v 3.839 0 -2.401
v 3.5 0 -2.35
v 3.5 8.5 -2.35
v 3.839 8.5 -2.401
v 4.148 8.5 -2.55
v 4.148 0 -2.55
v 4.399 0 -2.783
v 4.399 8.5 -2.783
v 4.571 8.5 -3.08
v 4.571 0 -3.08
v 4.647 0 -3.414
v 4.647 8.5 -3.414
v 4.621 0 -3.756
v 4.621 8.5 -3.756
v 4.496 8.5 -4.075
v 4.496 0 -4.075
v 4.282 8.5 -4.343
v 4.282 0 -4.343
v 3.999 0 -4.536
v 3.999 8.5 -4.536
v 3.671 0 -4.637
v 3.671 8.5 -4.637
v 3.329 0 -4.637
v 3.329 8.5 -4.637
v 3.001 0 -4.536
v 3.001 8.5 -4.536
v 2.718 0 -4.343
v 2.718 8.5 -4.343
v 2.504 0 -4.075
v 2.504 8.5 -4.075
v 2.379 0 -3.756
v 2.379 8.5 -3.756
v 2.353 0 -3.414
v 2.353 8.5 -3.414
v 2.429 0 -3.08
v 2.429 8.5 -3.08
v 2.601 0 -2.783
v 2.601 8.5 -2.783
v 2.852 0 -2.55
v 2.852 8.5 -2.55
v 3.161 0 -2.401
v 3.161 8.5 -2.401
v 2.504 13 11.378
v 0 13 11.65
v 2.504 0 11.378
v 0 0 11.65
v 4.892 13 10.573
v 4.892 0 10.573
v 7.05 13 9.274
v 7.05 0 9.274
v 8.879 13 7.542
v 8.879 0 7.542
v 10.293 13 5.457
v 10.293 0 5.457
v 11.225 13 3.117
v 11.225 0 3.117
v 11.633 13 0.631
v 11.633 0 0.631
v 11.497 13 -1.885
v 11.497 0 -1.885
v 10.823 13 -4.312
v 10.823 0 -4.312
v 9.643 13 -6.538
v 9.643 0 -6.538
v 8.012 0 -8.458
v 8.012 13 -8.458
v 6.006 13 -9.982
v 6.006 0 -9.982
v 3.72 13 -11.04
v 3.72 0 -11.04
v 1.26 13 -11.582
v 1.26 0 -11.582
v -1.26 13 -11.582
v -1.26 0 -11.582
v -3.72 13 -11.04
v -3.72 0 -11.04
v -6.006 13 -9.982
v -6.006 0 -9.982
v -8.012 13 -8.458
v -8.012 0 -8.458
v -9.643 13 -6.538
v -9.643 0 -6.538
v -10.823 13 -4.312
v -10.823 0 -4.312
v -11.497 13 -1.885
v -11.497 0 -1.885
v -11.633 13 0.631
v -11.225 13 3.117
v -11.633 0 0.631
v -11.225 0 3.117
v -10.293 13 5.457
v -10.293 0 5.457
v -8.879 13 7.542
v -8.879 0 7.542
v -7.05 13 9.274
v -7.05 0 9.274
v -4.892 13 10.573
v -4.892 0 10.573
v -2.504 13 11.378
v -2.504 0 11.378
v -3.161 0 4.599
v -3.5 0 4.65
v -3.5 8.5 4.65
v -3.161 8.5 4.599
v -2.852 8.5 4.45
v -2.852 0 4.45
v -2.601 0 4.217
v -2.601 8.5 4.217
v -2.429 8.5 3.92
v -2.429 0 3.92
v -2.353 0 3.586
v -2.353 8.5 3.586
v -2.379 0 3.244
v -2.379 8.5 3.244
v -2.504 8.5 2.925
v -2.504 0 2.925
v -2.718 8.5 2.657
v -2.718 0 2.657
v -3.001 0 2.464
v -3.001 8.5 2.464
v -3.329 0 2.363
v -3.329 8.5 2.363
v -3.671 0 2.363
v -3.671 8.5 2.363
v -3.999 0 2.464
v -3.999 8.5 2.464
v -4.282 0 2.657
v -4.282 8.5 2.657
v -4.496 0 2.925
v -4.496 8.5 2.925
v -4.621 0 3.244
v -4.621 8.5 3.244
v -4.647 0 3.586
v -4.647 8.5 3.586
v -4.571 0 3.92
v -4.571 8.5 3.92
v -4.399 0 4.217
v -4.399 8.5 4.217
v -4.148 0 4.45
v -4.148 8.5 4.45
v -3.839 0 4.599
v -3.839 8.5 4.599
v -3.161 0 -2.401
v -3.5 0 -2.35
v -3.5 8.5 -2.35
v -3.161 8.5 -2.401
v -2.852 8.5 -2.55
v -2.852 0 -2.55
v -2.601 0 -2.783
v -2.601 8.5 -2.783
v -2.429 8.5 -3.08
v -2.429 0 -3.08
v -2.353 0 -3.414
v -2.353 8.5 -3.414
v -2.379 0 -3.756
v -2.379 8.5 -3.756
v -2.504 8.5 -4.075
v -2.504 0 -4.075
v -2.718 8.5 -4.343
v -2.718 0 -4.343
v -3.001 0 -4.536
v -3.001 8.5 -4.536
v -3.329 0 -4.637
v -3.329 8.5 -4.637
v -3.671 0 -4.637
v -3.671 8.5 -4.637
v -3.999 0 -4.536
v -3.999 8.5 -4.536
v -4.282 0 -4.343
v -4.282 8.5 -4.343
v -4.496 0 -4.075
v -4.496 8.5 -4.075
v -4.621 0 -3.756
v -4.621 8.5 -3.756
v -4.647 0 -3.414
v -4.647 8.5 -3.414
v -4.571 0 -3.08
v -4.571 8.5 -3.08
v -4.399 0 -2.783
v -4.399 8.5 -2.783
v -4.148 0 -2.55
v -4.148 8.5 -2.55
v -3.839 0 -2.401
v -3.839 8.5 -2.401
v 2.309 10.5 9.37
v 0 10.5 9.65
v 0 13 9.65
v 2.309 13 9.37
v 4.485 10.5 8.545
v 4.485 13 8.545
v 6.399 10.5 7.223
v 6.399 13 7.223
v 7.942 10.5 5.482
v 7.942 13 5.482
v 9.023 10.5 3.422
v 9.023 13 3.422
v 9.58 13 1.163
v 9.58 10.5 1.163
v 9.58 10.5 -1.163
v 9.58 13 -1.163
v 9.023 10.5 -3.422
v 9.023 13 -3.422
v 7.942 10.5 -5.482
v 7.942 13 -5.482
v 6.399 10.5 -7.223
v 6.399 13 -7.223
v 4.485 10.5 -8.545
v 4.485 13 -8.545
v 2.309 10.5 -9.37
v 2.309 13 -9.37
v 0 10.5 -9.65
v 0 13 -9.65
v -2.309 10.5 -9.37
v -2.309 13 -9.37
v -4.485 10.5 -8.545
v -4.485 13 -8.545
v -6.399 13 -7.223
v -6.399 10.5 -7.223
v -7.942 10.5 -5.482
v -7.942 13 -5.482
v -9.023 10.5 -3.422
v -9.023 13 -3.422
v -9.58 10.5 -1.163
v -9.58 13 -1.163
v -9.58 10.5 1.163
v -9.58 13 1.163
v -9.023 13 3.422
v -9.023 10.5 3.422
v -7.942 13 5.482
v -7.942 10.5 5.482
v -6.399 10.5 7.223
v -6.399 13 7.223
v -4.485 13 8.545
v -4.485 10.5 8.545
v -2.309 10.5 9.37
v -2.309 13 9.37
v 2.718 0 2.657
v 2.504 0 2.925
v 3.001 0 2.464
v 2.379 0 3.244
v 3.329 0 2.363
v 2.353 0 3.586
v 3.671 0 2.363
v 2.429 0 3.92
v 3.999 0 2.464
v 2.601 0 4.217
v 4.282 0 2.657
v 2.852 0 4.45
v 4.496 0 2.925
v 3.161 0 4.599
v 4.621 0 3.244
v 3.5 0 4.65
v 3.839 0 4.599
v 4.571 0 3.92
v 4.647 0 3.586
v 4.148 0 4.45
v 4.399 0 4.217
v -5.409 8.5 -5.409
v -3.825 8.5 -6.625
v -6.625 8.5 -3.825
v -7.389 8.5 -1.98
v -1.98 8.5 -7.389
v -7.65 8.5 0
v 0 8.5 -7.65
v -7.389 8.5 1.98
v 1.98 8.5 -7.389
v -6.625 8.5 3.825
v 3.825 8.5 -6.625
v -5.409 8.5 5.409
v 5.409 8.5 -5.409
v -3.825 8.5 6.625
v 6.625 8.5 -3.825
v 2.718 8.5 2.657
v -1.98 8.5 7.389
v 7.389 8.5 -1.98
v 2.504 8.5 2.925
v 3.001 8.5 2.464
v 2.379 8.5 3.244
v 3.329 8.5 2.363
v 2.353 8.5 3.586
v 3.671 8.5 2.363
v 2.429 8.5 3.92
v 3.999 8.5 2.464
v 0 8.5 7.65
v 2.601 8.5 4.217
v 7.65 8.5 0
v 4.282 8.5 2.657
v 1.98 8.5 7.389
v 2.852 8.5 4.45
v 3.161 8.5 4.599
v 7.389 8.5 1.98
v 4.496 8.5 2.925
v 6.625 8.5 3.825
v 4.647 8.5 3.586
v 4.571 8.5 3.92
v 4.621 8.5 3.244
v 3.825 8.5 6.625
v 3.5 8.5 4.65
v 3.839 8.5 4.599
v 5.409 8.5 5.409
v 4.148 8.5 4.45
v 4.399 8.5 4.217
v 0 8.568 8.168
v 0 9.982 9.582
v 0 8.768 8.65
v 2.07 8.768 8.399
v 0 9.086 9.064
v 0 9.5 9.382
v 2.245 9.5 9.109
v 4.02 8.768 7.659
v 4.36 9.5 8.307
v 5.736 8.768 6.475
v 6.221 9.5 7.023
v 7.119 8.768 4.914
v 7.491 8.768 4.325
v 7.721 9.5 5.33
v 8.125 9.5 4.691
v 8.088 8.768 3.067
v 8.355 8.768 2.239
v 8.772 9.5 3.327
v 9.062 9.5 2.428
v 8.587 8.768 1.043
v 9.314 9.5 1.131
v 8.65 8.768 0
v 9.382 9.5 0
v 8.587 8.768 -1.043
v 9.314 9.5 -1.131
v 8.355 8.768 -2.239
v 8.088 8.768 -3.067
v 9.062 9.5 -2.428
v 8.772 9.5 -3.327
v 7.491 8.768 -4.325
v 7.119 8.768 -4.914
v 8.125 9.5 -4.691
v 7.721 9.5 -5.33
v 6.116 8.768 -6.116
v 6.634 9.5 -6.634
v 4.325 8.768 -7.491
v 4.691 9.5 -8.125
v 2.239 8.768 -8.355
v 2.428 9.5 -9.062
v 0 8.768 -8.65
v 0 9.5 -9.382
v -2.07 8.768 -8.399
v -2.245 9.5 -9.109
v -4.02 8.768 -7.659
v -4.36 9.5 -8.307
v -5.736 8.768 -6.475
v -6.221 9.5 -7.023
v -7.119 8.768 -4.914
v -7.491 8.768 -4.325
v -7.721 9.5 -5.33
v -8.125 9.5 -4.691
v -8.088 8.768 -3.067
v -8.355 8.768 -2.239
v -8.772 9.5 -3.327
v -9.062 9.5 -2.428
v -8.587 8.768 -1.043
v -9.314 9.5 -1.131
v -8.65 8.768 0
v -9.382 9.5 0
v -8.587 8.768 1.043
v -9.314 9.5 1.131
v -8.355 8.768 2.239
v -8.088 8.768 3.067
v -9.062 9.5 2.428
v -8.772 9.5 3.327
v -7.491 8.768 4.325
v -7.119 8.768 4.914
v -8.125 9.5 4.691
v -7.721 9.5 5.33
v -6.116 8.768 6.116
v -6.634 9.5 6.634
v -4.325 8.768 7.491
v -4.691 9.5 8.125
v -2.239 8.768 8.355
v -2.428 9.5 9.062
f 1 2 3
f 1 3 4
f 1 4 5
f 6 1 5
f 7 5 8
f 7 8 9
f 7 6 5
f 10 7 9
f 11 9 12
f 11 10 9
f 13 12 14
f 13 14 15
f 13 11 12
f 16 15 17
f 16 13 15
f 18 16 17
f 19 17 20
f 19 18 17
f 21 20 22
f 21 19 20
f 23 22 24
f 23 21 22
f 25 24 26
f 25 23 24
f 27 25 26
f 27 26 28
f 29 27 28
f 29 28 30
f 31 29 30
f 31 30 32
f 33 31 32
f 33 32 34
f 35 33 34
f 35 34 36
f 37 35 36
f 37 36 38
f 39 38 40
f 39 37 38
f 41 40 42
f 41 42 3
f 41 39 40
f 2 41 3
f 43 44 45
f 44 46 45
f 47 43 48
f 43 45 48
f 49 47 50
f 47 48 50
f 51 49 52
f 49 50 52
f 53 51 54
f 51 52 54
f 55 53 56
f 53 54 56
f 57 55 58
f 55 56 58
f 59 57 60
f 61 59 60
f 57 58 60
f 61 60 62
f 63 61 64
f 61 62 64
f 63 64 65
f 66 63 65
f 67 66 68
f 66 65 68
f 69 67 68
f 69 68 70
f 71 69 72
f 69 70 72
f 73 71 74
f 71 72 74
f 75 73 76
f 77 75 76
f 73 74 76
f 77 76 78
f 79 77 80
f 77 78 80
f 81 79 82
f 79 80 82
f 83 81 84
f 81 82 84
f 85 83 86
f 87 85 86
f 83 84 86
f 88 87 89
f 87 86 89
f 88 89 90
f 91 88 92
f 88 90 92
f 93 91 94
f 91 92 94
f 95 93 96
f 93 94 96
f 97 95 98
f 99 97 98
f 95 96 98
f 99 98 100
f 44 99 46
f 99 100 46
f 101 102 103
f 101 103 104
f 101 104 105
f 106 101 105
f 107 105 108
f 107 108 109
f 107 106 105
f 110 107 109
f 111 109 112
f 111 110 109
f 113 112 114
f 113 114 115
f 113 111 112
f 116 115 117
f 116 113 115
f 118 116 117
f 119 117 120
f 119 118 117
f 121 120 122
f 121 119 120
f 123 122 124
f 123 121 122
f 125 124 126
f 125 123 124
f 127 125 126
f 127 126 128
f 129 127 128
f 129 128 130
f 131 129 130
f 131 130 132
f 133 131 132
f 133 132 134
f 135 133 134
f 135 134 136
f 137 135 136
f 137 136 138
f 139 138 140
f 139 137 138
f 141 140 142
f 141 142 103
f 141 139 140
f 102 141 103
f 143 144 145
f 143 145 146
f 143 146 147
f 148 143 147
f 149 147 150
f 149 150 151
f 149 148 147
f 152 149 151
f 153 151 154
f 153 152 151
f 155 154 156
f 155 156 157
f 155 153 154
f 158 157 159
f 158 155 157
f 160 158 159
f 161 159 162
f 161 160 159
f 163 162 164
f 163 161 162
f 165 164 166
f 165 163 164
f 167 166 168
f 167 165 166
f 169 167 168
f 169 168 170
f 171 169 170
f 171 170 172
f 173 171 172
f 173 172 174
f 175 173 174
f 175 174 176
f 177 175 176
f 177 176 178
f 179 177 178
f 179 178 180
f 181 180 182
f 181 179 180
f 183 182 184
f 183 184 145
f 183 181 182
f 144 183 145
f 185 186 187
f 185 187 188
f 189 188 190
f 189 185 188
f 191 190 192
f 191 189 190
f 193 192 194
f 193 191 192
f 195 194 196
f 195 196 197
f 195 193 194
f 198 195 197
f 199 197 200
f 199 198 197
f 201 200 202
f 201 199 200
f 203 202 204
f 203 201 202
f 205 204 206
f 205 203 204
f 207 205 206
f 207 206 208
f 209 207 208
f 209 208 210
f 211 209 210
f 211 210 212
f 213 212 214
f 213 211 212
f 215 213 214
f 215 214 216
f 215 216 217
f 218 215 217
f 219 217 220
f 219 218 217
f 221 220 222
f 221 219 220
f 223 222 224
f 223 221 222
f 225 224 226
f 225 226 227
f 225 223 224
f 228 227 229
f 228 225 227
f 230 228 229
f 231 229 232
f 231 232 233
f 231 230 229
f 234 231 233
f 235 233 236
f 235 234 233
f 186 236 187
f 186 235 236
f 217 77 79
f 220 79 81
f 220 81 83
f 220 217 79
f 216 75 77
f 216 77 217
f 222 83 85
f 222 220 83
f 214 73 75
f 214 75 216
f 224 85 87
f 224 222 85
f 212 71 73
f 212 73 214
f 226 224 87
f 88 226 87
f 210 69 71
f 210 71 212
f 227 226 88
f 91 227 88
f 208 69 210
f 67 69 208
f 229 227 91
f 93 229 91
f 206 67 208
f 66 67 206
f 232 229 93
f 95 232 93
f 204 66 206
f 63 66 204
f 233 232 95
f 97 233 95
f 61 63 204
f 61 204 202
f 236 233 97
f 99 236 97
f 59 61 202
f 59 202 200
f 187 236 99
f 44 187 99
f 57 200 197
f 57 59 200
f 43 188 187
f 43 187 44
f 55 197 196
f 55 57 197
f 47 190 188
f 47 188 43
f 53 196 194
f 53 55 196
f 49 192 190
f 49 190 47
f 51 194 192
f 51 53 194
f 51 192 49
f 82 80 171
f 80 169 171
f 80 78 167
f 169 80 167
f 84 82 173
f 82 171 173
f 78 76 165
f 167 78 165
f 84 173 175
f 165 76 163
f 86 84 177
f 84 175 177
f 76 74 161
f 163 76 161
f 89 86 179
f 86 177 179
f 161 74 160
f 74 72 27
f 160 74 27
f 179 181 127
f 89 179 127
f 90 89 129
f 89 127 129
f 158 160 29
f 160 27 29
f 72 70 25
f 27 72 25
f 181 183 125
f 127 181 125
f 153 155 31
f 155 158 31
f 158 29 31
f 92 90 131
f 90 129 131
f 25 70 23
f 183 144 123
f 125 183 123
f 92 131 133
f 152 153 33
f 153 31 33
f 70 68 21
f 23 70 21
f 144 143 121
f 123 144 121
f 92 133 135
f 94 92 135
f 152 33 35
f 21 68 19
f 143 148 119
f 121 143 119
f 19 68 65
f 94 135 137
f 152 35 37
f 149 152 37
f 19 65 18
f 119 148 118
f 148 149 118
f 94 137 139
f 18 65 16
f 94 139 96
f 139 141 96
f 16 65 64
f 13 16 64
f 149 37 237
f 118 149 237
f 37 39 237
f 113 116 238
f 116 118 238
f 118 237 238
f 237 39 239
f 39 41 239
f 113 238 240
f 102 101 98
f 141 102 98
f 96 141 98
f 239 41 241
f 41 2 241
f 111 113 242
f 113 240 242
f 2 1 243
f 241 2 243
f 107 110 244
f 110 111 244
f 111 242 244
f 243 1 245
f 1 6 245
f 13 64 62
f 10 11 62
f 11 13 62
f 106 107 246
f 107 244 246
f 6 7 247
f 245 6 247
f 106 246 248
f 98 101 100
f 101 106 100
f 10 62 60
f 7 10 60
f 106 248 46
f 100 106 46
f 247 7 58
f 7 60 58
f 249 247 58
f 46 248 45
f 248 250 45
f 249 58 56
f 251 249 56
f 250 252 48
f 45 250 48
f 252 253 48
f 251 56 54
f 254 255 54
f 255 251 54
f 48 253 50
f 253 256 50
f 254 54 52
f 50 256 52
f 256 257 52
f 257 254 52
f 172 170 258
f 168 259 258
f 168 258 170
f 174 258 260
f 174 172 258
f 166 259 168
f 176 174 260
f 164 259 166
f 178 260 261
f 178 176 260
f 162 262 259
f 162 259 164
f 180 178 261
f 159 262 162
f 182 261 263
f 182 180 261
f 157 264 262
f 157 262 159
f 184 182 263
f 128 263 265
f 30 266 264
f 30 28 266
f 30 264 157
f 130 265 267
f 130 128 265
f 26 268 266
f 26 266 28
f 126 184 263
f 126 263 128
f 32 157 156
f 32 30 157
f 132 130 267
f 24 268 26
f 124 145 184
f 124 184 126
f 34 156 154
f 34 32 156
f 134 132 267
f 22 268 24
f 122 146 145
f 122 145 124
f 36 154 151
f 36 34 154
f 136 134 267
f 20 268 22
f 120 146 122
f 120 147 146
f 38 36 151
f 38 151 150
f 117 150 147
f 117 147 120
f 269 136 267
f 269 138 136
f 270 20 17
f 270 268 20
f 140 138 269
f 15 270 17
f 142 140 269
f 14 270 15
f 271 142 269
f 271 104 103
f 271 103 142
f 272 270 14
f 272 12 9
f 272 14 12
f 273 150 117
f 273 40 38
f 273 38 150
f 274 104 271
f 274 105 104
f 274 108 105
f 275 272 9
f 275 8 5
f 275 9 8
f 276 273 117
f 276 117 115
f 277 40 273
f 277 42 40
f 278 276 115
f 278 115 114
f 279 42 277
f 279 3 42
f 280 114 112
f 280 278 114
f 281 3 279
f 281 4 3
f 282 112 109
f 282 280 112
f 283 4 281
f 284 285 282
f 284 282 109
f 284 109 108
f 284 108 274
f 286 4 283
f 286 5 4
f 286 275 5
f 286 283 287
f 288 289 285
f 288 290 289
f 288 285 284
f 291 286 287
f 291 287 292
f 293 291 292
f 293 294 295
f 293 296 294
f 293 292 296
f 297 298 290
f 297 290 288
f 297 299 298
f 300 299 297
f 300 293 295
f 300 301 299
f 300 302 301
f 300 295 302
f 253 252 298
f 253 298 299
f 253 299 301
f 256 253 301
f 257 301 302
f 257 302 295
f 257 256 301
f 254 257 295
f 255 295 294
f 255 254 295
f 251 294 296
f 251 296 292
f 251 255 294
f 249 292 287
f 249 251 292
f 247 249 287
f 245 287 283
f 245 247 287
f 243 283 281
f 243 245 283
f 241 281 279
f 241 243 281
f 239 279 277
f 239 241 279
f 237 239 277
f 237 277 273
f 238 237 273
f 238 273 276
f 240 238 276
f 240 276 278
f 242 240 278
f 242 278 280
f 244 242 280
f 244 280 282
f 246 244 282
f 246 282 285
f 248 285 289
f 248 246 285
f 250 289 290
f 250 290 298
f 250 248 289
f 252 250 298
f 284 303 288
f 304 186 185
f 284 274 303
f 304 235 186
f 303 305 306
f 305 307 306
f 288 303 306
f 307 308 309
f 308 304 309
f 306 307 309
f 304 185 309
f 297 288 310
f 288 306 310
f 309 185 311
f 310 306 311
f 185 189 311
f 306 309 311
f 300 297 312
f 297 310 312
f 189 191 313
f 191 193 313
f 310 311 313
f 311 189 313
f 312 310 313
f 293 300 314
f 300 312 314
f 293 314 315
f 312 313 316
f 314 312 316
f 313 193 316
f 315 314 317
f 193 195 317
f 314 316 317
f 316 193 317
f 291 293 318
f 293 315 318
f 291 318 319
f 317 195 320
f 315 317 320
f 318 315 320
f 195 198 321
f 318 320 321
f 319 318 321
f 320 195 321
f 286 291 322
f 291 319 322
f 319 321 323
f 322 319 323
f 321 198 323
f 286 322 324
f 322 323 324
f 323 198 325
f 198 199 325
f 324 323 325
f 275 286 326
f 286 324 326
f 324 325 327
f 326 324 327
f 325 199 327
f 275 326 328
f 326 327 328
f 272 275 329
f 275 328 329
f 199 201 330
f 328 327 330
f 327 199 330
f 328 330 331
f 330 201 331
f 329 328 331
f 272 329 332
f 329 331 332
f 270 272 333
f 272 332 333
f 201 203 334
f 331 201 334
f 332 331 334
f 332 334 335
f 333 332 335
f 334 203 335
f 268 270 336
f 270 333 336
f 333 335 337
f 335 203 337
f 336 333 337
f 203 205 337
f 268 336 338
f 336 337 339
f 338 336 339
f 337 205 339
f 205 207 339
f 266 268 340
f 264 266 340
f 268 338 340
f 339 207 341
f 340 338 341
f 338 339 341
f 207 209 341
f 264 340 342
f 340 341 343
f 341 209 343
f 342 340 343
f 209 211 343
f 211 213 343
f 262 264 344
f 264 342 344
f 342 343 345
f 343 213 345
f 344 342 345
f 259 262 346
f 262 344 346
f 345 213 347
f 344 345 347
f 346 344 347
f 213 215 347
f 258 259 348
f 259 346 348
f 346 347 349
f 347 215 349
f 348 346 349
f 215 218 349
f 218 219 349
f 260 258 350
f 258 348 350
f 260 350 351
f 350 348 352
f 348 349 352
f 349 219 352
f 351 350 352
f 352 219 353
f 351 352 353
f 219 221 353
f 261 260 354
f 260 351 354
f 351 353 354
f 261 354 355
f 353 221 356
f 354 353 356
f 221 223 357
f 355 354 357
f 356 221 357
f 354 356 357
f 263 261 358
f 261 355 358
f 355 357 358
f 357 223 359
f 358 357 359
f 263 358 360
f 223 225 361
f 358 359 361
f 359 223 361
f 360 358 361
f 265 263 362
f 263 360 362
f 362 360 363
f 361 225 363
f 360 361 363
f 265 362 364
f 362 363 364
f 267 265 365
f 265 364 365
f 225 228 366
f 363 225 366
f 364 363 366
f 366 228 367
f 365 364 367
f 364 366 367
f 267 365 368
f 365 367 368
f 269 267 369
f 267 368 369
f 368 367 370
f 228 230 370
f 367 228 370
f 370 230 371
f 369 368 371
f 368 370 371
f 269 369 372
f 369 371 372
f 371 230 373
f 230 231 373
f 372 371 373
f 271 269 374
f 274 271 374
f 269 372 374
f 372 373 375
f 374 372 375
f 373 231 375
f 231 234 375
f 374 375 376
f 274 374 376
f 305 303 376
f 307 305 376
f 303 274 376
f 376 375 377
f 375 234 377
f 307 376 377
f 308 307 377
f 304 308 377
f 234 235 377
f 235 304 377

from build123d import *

# Parameters (mm, degrees)
SKETCH1_R           = 11.65
SKETCH1_R_2         = 1.15
BOSS_EXTRUDE1_DEPTH = 8.5
SKETCH3_R           = 11.65
SKETCH3_R_2         = 9.65
BOSS_EXTRUDE3_DEPTH = 4.5
FILLET2_R           = 2


with BuildPart() as part:
    # Sketch1 → Boss-Extrude1 (new body)
    with BuildSketch(Plane(origin=(0, 0, 0), x_dir=(1, 0, 0), z_dir=(0, 1, 0))):
        with Locations(Location((0, 0, 0), (0, 0, 270))):
            Circle(SKETCH1_R)
        with Locations(Location((-3.5, 3.5, 0), (0, 0, 270))):
            Circle(SKETCH1_R_2, mode=Mode.SUBTRACT)
        with Locations(Location((3.5, 3.5, 0), (0, 0, 270))):
            Circle(SKETCH1_R_2, mode=Mode.SUBTRACT)
        with Locations(Location((3.5, -3.5, 0), (0, 0, 270))):
            Circle(SKETCH1_R_2, mode=Mode.SUBTRACT)
        with Locations(Location((-3.5, -3.5, 0), (0, 0, 270))):
            Circle(SKETCH1_R_2, mode=Mode.SUBTRACT)
    extrude(amount=BOSS_EXTRUDE1_DEPTH)

    # Sketch3 → Boss-Extrude3 (add)
    with BuildSketch(Plane(origin=(0, 8.5, 0), x_dir=(1, 0, 0), z_dir=(0, 1, 0))):
        with Locations(Location((0, 0, 0), (0, 0, 270))):
            Circle(SKETCH3_R)
        with Locations(Location((0, 0, 0), (0, 0, 270))):
            Circle(SKETCH3_R_2, mode=Mode.SUBTRACT)
    extrude(amount=BOSS_EXTRUDE3_DEPTH)

    # Fillet2
    fillet2_edges = [part.edges().sort_by_distance(p)[0] for p in [
        (0, 8.5, -9.65),
    ]]
    fillet(fillet2_edges, radius=FILLET2_R)


solid = part.part
